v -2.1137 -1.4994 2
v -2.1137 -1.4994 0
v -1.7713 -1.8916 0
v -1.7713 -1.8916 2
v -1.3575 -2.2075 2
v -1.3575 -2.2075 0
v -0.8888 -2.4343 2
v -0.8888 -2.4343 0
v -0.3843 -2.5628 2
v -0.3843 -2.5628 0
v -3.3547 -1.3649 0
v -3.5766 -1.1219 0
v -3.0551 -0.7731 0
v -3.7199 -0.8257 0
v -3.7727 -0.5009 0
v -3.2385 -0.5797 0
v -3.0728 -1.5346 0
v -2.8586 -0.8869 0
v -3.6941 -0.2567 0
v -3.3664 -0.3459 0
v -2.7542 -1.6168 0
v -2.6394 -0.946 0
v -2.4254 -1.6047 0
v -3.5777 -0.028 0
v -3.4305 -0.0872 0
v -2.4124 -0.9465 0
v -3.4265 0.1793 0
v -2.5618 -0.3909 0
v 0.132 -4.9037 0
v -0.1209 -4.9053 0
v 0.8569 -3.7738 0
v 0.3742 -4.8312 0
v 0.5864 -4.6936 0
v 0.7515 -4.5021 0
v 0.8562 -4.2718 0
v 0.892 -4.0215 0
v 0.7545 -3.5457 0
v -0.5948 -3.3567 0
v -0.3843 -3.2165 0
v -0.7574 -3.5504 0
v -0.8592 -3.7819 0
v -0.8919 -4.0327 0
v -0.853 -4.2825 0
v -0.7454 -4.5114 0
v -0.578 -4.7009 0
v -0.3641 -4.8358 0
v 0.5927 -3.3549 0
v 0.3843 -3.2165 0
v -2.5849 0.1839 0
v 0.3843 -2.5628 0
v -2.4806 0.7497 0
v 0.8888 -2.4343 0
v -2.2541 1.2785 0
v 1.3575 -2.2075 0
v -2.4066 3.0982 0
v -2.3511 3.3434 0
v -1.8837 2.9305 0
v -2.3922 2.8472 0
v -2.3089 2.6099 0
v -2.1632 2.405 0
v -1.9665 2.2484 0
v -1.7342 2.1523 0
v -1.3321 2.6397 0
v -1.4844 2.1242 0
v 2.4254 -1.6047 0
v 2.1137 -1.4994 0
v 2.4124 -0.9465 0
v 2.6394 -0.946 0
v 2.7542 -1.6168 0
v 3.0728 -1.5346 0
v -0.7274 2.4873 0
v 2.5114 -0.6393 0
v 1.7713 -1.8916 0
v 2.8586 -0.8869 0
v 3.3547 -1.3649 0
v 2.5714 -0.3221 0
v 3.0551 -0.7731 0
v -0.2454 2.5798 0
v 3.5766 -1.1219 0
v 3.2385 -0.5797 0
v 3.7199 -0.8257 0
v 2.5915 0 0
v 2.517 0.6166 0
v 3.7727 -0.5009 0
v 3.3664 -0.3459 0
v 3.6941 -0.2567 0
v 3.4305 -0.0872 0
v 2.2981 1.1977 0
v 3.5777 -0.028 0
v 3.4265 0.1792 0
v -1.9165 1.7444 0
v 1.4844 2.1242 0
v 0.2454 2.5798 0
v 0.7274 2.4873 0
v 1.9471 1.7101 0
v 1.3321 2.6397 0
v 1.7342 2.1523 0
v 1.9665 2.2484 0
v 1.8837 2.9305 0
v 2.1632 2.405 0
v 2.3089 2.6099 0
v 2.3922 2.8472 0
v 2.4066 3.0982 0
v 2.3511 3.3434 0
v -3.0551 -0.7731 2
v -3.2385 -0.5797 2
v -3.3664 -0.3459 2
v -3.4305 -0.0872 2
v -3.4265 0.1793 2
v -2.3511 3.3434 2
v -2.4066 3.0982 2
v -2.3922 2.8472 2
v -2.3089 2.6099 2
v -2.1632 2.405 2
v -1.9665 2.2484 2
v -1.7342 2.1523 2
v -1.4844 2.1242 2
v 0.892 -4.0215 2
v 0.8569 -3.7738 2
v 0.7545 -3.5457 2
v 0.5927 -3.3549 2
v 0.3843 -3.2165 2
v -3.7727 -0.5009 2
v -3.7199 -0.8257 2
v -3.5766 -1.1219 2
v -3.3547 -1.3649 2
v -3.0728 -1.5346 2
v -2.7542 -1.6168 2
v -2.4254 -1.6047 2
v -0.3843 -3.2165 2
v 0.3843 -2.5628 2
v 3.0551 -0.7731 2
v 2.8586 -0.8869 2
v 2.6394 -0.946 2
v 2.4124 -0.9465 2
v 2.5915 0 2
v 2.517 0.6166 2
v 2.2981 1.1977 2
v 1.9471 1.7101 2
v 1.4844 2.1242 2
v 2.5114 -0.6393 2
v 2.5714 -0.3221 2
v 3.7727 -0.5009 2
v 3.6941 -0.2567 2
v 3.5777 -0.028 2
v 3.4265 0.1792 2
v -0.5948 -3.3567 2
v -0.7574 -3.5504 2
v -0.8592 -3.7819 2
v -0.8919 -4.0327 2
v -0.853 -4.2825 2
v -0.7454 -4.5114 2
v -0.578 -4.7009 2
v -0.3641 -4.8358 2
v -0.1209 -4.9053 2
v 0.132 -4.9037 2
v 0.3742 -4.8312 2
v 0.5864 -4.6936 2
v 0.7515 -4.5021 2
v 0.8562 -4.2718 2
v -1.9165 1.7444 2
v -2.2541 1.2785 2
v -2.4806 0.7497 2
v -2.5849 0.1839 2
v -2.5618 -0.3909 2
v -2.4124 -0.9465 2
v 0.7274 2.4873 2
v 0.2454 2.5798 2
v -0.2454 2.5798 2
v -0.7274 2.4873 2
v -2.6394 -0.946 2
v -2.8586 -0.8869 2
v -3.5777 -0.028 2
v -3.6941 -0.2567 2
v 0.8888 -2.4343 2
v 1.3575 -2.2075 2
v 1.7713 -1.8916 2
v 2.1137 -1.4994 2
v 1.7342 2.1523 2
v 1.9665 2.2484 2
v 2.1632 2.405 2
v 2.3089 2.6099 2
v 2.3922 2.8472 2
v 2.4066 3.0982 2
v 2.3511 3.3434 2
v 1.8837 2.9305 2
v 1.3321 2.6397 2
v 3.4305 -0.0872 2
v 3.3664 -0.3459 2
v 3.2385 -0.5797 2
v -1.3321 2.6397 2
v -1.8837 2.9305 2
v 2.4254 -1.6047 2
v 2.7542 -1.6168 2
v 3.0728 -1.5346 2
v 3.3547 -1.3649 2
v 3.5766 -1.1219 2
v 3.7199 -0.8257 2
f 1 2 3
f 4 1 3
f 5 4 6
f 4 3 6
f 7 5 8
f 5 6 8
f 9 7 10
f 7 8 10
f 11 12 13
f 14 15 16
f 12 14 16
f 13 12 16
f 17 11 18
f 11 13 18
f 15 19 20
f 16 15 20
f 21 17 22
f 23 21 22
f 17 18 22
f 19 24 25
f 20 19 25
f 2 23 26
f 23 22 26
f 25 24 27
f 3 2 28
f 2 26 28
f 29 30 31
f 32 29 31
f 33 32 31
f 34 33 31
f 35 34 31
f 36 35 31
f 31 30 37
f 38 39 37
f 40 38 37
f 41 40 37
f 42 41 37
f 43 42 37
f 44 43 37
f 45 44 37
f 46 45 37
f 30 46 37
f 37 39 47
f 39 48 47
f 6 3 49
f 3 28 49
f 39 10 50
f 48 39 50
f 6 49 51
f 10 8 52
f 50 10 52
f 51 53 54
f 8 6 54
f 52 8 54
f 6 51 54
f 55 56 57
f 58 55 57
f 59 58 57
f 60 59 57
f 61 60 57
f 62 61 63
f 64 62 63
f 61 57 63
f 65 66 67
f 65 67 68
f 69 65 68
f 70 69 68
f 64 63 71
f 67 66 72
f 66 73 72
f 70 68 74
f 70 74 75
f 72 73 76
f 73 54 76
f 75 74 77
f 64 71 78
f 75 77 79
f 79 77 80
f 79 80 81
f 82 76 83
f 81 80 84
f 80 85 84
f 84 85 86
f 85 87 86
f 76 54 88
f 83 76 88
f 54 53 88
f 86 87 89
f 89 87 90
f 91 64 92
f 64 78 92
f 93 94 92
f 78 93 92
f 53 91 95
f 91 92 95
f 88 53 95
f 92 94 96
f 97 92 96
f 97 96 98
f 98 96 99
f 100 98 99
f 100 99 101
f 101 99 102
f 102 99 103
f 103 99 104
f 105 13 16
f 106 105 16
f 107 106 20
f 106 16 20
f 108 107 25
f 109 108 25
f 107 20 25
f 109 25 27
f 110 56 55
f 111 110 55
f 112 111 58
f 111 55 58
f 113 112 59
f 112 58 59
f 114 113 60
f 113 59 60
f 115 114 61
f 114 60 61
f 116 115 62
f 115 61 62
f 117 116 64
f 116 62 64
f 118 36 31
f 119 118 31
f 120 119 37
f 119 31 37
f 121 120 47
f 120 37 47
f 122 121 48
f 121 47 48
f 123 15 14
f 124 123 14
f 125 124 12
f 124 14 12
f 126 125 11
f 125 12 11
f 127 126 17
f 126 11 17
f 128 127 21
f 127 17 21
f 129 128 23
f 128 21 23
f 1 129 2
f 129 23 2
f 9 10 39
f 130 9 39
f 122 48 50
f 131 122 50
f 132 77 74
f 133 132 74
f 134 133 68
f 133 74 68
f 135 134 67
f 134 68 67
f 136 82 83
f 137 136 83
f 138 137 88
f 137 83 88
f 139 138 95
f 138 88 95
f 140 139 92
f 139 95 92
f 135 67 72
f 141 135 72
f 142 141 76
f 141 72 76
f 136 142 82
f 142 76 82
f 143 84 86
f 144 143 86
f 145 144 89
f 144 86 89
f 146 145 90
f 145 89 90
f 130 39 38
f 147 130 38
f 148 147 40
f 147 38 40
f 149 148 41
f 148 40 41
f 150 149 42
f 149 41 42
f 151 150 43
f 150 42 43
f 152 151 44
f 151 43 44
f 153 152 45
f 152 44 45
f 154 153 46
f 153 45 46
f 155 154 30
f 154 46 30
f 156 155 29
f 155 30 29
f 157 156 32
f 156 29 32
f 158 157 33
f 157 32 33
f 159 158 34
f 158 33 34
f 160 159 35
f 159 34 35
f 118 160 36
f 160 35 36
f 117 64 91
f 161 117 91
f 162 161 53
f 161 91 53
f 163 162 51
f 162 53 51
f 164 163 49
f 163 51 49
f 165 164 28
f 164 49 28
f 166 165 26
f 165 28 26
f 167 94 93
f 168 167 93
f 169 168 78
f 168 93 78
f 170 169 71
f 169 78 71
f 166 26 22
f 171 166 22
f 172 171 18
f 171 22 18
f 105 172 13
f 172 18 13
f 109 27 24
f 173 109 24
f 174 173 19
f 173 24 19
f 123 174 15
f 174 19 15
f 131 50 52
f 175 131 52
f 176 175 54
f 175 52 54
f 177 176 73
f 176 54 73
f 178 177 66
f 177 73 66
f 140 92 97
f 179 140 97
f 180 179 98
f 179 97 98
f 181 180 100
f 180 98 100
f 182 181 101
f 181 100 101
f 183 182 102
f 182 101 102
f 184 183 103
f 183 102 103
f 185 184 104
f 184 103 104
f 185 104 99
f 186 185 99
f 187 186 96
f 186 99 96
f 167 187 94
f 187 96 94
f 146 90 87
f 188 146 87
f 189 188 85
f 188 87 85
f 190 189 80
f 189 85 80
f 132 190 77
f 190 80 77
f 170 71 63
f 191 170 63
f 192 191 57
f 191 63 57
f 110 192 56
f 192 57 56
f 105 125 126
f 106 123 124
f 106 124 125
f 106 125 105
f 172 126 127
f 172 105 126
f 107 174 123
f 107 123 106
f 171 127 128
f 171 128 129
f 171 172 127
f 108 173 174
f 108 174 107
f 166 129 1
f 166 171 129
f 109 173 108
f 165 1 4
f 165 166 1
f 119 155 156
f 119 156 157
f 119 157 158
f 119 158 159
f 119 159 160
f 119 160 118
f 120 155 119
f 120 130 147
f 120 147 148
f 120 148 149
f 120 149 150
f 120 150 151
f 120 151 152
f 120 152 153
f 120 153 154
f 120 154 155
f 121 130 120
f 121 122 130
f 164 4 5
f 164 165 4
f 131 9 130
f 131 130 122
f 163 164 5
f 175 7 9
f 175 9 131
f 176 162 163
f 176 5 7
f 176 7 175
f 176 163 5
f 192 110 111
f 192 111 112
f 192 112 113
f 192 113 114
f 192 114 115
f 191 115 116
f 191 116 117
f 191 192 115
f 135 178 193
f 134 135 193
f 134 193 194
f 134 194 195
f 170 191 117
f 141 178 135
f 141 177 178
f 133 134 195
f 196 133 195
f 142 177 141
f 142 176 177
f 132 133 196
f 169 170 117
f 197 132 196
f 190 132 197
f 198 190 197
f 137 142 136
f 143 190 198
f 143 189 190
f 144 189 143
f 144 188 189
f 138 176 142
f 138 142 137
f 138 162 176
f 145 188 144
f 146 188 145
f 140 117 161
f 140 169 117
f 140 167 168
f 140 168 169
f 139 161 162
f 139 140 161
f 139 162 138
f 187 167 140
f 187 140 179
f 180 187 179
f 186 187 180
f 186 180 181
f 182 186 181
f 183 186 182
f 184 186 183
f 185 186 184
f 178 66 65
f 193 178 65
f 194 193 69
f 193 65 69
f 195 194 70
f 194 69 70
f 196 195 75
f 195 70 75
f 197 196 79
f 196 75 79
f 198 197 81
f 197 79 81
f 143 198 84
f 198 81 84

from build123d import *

# Parameters (mm, degrees)
F1_DEPTH = 2


with BuildPart() as f1:
    # F0 (on Top) → F1 (new body)
    with BuildSketch(Plane.XY):
        with BuildLine():
            ThreePointArc((-1.484384, 2.124211), (-1.120709, 2.336596), (-0.727436, 2.487269))
            ThreePointArc((-0.727436, 2.487269), (-1.616601, 2.768638), (-2.351094, 3.343359))
            ThreePointArc((-2.351094, 3.343359), (-2.243244, 2.502379), (-1.484384, 2.124211))
        make_face()
        with BuildLine():
            ThreePointArc((-2.113658, -1.499373), (-2.279864, -1.232027), (-2.412428, -0.9465))
            ThreePointArc((-2.412428, -0.9465), (-2.750971, -0.923594), (-3.055104, -0.773129))
            ThreePointArc((-3.055104, -0.773129), (-3.36643, -0.345932), (-3.426473, 0.17925))
            ThreePointArc((-3.426473, 0.17925), (-3.640466, -0.140011), (-3.772722, -0.500882))
            ThreePointArc((-3.772722, -0.500882), (-3.219918, -1.459931), (-2.113658, -1.499373))
        make_face()
        with BuildLine():
            ThreePointArc((3.055104, -0.773129), (2.750971, -0.923594), (2.412428, -0.9465))
            ThreePointArc((2.412428, -0.9465), (2.279864, -1.232027), (2.113658, -1.499373))
            ThreePointArc((2.113658, -1.499373), (3.219918, -1.459931), (3.772722, -0.500882))
            ThreePointArc((3.772722, -0.500882), (3.640466, -0.140011), (3.426473, 0.17925))
            ThreePointArc((3.426473, 0.17925), (3.36643, -0.345932), (3.055104, -0.773129))
        make_face()
        with BuildLine():
            ThreePointArc((0.892009, -4.021506), (0.754487, -3.54566), (0.384325, -3.216537))
            ThreePointArc((0.384325, -3.216537), (0, -3.129497), (-0.384325, -3.216537))
            ThreePointArc((-0.384325, -3.216537), (-0.475846, -4.775993), (0.892009, -4.021506))
        make_face()
        with BuildLine():
            ThreePointArc((2.591461, 0), (2.298085, 1.197695), (1.484384, 2.124211))
            ThreePointArc((1.484384, 2.124211), (1.120709, 2.336596), (0.727436, 2.487269))
            ThreePointArc((0.727436, 2.487269), (0, 2.591461), (-0.727436, 2.487269))
            ThreePointArc((-0.727436, 2.487269), (-1.120709, 2.336596), (-1.484384, 2.124211))
            ThreePointArc((-1.484384, 2.124211), (-2.480645, 0.749711), (-2.412428, -0.9465))
            ThreePointArc((-2.412428, -0.9465), (-2.276223, -1.230181), (-2.111146, -1.498092))
            ThreePointArc((-2.111146, -1.498092), (-2.112401, -1.498733), (-2.113658, -1.499373))
            ThreePointArc((-2.113658, -1.499373), (-1.357461, -2.20748), (-0.384325, -2.562804))
            ThreePointArc((-0.384325, -2.562804), (0, -2.591461), (0.384325, -2.562804))
            ThreePointArc((0.384325, -2.562804), (1.357461, -2.20748), (2.113658, -1.499373))
            ThreePointArc((2.113658, -1.499373), (2.279864, -1.232027), (2.412428, -0.9465))
            ThreePointArc((2.412428, -0.9465), (2.546309, -0.481642), (2.591461, 0))
        make_face()
        with BuildLine():
            ThreePointArc((0.727436, 2.487269), (1.120709, 2.336596), (1.484384, 2.124211))
            ThreePointArc((1.484384, 2.124211), (2.243244, 2.502379), (2.351094, 3.343359))
            ThreePointArc((2.351094, 3.343359), (1.616601, 2.768638), (0.727436, 2.487269))
        make_face()
        with BuildLine():
            Line((0.384325, -3.216537), (0.384325, -2.562804))
            ThreePointArc((0.384325, -2.562804), (0, -2.591461), (-0.384325, -2.562804))
            Line((-0.384325, -2.562804), (-0.384325, -3.216537))
            ThreePointArc((-0.384325, -3.216537), (0, -3.129497), (0.384325, -3.216537))
        make_face()
        with BuildLine():
            ThreePointArc((-2.111146, -1.498092), (-2.276223, -1.230181), (-2.412428, -0.9465))
            ThreePointArc((-2.412428, -0.9465), (-2.279864, -1.232027), (-2.113658, -1.499373))
            ThreePointArc((-2.113658, -1.499373), (-2.112401, -1.498733), (-2.111146, -1.498092))
        make_face()
    extrude(amount=F1_DEPTH)


solid = f1.part
